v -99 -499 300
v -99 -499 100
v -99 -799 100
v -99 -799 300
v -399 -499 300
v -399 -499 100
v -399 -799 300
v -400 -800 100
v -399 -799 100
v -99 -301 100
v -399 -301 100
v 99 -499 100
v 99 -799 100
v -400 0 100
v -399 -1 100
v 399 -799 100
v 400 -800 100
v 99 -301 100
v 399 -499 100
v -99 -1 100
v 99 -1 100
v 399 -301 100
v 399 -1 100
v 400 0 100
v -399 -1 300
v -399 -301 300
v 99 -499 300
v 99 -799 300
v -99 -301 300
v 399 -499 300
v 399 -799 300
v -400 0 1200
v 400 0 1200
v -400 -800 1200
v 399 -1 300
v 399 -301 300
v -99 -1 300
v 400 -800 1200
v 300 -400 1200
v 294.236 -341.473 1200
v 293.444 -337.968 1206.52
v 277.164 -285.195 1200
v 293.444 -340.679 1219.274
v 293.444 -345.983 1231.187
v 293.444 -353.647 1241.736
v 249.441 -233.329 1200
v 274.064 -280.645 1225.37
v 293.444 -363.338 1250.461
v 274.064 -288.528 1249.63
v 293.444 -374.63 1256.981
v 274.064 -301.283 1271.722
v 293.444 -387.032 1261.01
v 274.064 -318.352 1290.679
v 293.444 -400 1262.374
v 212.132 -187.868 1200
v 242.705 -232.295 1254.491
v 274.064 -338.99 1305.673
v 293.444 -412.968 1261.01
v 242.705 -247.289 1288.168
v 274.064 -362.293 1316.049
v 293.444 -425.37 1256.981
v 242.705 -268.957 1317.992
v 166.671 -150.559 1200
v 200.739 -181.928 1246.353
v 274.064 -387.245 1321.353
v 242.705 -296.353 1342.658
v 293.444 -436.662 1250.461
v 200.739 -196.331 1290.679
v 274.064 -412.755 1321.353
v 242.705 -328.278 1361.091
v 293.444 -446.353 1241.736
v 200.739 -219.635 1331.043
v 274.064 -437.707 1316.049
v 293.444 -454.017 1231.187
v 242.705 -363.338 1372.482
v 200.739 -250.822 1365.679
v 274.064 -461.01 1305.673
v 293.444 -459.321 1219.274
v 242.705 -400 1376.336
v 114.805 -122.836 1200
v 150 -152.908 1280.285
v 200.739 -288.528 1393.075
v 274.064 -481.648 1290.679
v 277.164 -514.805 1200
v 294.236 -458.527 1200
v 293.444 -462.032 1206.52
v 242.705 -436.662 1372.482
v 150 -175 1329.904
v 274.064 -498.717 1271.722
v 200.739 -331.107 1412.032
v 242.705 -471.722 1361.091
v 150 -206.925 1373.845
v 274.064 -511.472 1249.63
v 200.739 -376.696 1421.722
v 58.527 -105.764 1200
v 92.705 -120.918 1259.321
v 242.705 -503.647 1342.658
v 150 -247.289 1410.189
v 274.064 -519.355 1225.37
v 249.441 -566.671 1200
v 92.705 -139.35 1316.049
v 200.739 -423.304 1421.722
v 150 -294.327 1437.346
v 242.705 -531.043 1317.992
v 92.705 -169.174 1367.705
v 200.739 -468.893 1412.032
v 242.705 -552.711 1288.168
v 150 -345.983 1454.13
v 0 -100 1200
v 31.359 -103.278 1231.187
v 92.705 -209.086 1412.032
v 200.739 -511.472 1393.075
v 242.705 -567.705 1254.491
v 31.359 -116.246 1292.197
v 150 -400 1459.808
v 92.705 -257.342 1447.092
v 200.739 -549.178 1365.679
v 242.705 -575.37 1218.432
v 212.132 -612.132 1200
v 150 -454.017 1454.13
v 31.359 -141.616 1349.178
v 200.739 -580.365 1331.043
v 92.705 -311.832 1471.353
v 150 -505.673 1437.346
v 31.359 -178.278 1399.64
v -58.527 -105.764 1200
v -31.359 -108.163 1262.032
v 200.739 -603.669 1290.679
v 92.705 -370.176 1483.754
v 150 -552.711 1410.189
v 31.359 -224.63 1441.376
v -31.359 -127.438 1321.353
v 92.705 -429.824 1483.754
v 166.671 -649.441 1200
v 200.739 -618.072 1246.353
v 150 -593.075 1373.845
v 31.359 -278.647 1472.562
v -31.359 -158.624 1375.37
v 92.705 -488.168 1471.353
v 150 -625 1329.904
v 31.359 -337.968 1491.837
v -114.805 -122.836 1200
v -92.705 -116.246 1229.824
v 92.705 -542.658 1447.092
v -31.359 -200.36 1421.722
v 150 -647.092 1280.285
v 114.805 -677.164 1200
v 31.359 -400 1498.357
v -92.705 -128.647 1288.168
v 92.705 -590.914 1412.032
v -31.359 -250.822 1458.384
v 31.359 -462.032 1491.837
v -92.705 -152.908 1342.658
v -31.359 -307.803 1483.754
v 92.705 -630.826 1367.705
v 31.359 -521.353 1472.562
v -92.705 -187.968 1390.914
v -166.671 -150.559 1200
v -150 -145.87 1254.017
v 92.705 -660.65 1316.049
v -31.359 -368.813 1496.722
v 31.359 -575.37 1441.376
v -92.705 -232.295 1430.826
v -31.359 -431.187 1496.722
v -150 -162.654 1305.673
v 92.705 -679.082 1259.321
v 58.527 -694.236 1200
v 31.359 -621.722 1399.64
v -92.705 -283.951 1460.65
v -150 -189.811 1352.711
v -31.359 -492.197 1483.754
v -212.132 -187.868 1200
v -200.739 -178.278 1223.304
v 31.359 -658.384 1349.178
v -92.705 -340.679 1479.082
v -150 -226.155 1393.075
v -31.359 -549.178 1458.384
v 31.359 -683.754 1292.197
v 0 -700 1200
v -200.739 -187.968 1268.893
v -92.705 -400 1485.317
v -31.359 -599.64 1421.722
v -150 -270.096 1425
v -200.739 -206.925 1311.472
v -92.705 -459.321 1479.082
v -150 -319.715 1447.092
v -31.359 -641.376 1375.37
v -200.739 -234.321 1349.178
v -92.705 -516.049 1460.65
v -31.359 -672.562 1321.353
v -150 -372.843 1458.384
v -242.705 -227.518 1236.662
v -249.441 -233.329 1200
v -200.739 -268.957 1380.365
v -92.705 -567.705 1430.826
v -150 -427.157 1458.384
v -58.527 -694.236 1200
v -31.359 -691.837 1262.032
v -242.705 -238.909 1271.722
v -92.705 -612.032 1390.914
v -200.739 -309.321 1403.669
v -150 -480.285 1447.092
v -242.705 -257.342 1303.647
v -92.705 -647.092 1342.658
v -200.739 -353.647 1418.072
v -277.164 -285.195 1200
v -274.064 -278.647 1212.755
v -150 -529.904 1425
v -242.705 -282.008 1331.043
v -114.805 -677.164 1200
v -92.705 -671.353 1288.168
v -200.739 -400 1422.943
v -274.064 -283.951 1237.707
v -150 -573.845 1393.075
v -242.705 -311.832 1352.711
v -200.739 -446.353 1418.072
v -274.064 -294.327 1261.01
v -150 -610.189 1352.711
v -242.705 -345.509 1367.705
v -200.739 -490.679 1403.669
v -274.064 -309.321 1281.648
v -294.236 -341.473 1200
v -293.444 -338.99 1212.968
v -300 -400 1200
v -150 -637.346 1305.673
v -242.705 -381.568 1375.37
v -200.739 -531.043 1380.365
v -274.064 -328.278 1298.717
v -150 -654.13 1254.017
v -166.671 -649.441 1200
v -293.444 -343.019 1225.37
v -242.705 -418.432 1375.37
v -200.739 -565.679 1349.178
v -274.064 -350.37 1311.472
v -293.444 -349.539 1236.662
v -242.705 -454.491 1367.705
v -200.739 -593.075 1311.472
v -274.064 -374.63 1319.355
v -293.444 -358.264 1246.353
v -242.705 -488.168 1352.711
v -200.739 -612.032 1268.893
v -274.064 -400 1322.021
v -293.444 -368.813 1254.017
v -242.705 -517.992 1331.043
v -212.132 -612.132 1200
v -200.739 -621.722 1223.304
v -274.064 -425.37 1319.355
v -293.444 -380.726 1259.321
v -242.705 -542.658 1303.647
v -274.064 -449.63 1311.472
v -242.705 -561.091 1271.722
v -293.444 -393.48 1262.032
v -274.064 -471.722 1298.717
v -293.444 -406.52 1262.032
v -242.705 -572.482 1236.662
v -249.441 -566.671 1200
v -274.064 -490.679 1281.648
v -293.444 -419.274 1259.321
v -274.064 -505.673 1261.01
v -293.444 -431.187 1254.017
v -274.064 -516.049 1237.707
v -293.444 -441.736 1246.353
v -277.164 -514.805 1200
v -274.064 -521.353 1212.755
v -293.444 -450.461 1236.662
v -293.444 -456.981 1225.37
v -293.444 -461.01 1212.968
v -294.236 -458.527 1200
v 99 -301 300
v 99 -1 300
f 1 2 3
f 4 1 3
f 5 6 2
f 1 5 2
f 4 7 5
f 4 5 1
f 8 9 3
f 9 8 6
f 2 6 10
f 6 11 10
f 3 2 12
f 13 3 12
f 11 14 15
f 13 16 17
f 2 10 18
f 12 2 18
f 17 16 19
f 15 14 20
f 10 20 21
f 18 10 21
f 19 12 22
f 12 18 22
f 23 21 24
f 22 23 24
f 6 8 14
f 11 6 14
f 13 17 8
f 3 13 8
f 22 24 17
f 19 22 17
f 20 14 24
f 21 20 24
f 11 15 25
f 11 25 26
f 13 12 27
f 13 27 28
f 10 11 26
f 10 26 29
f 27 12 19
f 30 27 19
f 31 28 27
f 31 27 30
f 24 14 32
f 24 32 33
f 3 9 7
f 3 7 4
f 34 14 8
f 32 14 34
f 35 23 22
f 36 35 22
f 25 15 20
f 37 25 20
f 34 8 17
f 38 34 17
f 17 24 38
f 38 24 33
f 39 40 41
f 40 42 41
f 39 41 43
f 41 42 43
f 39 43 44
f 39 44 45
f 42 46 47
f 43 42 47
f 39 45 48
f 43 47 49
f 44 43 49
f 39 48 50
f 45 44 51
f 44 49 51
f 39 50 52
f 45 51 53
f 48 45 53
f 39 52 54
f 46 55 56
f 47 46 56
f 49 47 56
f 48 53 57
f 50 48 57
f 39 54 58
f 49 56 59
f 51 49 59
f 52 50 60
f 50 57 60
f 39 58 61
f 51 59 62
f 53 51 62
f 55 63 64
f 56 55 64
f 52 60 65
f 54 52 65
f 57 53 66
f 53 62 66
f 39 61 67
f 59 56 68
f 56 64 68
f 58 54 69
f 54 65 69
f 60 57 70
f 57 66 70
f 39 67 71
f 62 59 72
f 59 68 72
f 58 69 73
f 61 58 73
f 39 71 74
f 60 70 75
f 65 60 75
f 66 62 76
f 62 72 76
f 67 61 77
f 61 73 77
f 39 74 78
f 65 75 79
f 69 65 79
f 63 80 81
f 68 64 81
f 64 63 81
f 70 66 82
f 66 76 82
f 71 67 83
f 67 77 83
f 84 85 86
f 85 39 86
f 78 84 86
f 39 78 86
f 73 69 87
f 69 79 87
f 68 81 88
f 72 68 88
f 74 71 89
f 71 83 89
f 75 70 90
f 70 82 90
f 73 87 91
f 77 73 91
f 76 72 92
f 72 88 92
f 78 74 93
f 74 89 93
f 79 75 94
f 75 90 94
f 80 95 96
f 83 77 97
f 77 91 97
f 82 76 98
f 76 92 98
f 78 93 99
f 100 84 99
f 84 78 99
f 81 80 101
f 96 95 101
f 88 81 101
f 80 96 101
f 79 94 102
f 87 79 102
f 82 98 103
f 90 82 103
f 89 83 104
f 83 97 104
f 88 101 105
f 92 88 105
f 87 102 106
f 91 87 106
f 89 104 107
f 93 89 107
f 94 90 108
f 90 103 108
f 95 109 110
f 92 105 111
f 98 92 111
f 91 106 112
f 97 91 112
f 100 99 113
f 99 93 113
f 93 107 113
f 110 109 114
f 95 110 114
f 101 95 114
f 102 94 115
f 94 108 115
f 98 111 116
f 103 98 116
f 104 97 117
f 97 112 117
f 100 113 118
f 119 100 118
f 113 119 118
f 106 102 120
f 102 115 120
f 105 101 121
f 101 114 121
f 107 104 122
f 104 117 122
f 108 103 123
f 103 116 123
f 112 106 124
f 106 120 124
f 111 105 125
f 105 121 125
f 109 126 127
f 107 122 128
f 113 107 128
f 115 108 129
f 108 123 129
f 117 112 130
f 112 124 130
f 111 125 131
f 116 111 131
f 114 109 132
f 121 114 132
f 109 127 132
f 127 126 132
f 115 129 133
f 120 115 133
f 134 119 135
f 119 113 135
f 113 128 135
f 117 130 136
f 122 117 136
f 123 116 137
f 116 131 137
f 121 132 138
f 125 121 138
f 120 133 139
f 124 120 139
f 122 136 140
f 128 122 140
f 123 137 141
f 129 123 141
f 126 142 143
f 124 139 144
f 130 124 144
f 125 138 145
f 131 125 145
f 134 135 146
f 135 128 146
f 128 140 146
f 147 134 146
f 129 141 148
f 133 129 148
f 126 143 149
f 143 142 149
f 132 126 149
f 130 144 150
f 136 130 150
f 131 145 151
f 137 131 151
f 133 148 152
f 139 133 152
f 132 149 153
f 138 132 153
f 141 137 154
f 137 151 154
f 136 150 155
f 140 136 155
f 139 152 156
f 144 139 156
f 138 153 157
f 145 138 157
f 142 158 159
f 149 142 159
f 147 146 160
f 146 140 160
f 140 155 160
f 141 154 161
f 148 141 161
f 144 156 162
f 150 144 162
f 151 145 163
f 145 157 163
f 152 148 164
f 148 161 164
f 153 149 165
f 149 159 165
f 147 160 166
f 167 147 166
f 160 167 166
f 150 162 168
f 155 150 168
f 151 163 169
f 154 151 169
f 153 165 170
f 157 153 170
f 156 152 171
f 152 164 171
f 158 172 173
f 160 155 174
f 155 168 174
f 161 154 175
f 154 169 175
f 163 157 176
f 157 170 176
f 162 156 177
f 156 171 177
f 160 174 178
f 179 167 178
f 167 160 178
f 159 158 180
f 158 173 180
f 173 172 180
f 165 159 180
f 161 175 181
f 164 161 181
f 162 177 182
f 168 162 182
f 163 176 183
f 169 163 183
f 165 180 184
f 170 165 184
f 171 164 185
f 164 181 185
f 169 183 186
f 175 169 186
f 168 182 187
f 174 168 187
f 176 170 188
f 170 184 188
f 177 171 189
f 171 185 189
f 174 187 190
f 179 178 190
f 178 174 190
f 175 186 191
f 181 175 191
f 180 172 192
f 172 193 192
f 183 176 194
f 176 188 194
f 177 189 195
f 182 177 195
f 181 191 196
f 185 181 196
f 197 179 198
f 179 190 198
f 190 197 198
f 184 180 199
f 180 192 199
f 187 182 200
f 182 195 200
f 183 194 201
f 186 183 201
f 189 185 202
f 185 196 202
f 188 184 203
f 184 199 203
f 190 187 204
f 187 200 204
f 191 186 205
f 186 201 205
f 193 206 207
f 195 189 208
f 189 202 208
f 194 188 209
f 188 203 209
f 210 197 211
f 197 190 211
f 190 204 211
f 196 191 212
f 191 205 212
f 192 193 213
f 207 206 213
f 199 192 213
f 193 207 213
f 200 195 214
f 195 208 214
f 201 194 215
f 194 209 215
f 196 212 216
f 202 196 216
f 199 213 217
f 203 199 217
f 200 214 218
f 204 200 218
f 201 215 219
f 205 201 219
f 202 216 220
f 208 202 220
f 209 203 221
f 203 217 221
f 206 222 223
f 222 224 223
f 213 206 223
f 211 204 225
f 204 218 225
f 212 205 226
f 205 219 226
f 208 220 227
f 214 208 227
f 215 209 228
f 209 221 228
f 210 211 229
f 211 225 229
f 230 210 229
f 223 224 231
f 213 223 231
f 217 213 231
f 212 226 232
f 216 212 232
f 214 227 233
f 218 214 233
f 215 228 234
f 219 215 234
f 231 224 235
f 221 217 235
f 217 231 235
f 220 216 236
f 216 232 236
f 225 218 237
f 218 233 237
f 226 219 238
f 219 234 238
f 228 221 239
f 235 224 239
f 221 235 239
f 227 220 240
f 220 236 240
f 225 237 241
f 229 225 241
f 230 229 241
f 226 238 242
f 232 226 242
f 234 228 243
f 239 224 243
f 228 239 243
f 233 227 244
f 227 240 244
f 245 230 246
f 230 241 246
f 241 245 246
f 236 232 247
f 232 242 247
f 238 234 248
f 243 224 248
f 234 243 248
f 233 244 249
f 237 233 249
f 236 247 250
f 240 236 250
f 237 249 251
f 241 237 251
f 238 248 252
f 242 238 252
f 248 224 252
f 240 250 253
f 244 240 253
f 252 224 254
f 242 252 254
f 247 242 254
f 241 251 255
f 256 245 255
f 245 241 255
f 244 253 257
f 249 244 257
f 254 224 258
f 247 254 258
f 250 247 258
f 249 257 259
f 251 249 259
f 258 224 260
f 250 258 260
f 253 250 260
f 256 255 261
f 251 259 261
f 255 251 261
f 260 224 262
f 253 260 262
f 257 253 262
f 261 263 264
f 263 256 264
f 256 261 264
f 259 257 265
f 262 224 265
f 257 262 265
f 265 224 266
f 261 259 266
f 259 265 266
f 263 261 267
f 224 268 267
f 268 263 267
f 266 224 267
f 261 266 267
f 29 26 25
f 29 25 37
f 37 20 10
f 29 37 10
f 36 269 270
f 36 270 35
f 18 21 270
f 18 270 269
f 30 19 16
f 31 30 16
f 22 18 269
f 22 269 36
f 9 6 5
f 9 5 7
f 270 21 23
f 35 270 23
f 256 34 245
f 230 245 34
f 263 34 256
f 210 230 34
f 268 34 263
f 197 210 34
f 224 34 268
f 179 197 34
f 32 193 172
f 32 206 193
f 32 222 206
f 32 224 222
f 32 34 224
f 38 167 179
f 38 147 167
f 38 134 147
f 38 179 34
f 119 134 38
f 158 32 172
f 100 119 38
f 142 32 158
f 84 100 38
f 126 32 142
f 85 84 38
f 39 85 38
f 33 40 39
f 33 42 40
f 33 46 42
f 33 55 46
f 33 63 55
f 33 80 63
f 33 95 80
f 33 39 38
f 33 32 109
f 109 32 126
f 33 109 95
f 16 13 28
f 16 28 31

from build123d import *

# Parameters (mm, degrees)
F0_W     = 800
F0_H     = 1100
F1_DEPTH = 800
F4_W     = 300
F4_H     = 300
F5_DEPTH = 200


with BuildPart() as f1:
    # F0 (on Front) → F1 (new body)
    with BuildSketch(Plane.XZ):
        with Locations((0, 650)):
            Rectangle(F0_W, F0_H)
    extrude(amount=F1_DEPTH)

    # F2 (on face) → F3 (revolve)
    with BuildSketch(Plane.XY.offset(1200)):
        with BuildLine():
            ThreePointArc((300, -400), (0, -100), (-300, -400))
            Line((-300, -400), (300, -400))
        make_face()
    revolve(axis=Axis((0, -400, 1200), (1, 0, 0)))

    # F4 (on face) → F5 (cut)
    with BuildSketch(Plane(origin=(0, 0, 100), x_dir=(1, 0, 0), z_dir=(0, 0, -1))):
        with Locations((-249, 649)):
            Rectangle(F4_W, F4_H)
        with Locations((249, 649)):
            Rectangle(F4_W, F4_H)
        with Locations((249, 151)):
            Rectangle(F4_W, F4_H)
        with Locations((-249, 151)):
            Rectangle(F4_W, F4_H)
    extrude(amount=-F5_DEPTH, mode=Mode.SUBTRACT)


solid = f1.part
